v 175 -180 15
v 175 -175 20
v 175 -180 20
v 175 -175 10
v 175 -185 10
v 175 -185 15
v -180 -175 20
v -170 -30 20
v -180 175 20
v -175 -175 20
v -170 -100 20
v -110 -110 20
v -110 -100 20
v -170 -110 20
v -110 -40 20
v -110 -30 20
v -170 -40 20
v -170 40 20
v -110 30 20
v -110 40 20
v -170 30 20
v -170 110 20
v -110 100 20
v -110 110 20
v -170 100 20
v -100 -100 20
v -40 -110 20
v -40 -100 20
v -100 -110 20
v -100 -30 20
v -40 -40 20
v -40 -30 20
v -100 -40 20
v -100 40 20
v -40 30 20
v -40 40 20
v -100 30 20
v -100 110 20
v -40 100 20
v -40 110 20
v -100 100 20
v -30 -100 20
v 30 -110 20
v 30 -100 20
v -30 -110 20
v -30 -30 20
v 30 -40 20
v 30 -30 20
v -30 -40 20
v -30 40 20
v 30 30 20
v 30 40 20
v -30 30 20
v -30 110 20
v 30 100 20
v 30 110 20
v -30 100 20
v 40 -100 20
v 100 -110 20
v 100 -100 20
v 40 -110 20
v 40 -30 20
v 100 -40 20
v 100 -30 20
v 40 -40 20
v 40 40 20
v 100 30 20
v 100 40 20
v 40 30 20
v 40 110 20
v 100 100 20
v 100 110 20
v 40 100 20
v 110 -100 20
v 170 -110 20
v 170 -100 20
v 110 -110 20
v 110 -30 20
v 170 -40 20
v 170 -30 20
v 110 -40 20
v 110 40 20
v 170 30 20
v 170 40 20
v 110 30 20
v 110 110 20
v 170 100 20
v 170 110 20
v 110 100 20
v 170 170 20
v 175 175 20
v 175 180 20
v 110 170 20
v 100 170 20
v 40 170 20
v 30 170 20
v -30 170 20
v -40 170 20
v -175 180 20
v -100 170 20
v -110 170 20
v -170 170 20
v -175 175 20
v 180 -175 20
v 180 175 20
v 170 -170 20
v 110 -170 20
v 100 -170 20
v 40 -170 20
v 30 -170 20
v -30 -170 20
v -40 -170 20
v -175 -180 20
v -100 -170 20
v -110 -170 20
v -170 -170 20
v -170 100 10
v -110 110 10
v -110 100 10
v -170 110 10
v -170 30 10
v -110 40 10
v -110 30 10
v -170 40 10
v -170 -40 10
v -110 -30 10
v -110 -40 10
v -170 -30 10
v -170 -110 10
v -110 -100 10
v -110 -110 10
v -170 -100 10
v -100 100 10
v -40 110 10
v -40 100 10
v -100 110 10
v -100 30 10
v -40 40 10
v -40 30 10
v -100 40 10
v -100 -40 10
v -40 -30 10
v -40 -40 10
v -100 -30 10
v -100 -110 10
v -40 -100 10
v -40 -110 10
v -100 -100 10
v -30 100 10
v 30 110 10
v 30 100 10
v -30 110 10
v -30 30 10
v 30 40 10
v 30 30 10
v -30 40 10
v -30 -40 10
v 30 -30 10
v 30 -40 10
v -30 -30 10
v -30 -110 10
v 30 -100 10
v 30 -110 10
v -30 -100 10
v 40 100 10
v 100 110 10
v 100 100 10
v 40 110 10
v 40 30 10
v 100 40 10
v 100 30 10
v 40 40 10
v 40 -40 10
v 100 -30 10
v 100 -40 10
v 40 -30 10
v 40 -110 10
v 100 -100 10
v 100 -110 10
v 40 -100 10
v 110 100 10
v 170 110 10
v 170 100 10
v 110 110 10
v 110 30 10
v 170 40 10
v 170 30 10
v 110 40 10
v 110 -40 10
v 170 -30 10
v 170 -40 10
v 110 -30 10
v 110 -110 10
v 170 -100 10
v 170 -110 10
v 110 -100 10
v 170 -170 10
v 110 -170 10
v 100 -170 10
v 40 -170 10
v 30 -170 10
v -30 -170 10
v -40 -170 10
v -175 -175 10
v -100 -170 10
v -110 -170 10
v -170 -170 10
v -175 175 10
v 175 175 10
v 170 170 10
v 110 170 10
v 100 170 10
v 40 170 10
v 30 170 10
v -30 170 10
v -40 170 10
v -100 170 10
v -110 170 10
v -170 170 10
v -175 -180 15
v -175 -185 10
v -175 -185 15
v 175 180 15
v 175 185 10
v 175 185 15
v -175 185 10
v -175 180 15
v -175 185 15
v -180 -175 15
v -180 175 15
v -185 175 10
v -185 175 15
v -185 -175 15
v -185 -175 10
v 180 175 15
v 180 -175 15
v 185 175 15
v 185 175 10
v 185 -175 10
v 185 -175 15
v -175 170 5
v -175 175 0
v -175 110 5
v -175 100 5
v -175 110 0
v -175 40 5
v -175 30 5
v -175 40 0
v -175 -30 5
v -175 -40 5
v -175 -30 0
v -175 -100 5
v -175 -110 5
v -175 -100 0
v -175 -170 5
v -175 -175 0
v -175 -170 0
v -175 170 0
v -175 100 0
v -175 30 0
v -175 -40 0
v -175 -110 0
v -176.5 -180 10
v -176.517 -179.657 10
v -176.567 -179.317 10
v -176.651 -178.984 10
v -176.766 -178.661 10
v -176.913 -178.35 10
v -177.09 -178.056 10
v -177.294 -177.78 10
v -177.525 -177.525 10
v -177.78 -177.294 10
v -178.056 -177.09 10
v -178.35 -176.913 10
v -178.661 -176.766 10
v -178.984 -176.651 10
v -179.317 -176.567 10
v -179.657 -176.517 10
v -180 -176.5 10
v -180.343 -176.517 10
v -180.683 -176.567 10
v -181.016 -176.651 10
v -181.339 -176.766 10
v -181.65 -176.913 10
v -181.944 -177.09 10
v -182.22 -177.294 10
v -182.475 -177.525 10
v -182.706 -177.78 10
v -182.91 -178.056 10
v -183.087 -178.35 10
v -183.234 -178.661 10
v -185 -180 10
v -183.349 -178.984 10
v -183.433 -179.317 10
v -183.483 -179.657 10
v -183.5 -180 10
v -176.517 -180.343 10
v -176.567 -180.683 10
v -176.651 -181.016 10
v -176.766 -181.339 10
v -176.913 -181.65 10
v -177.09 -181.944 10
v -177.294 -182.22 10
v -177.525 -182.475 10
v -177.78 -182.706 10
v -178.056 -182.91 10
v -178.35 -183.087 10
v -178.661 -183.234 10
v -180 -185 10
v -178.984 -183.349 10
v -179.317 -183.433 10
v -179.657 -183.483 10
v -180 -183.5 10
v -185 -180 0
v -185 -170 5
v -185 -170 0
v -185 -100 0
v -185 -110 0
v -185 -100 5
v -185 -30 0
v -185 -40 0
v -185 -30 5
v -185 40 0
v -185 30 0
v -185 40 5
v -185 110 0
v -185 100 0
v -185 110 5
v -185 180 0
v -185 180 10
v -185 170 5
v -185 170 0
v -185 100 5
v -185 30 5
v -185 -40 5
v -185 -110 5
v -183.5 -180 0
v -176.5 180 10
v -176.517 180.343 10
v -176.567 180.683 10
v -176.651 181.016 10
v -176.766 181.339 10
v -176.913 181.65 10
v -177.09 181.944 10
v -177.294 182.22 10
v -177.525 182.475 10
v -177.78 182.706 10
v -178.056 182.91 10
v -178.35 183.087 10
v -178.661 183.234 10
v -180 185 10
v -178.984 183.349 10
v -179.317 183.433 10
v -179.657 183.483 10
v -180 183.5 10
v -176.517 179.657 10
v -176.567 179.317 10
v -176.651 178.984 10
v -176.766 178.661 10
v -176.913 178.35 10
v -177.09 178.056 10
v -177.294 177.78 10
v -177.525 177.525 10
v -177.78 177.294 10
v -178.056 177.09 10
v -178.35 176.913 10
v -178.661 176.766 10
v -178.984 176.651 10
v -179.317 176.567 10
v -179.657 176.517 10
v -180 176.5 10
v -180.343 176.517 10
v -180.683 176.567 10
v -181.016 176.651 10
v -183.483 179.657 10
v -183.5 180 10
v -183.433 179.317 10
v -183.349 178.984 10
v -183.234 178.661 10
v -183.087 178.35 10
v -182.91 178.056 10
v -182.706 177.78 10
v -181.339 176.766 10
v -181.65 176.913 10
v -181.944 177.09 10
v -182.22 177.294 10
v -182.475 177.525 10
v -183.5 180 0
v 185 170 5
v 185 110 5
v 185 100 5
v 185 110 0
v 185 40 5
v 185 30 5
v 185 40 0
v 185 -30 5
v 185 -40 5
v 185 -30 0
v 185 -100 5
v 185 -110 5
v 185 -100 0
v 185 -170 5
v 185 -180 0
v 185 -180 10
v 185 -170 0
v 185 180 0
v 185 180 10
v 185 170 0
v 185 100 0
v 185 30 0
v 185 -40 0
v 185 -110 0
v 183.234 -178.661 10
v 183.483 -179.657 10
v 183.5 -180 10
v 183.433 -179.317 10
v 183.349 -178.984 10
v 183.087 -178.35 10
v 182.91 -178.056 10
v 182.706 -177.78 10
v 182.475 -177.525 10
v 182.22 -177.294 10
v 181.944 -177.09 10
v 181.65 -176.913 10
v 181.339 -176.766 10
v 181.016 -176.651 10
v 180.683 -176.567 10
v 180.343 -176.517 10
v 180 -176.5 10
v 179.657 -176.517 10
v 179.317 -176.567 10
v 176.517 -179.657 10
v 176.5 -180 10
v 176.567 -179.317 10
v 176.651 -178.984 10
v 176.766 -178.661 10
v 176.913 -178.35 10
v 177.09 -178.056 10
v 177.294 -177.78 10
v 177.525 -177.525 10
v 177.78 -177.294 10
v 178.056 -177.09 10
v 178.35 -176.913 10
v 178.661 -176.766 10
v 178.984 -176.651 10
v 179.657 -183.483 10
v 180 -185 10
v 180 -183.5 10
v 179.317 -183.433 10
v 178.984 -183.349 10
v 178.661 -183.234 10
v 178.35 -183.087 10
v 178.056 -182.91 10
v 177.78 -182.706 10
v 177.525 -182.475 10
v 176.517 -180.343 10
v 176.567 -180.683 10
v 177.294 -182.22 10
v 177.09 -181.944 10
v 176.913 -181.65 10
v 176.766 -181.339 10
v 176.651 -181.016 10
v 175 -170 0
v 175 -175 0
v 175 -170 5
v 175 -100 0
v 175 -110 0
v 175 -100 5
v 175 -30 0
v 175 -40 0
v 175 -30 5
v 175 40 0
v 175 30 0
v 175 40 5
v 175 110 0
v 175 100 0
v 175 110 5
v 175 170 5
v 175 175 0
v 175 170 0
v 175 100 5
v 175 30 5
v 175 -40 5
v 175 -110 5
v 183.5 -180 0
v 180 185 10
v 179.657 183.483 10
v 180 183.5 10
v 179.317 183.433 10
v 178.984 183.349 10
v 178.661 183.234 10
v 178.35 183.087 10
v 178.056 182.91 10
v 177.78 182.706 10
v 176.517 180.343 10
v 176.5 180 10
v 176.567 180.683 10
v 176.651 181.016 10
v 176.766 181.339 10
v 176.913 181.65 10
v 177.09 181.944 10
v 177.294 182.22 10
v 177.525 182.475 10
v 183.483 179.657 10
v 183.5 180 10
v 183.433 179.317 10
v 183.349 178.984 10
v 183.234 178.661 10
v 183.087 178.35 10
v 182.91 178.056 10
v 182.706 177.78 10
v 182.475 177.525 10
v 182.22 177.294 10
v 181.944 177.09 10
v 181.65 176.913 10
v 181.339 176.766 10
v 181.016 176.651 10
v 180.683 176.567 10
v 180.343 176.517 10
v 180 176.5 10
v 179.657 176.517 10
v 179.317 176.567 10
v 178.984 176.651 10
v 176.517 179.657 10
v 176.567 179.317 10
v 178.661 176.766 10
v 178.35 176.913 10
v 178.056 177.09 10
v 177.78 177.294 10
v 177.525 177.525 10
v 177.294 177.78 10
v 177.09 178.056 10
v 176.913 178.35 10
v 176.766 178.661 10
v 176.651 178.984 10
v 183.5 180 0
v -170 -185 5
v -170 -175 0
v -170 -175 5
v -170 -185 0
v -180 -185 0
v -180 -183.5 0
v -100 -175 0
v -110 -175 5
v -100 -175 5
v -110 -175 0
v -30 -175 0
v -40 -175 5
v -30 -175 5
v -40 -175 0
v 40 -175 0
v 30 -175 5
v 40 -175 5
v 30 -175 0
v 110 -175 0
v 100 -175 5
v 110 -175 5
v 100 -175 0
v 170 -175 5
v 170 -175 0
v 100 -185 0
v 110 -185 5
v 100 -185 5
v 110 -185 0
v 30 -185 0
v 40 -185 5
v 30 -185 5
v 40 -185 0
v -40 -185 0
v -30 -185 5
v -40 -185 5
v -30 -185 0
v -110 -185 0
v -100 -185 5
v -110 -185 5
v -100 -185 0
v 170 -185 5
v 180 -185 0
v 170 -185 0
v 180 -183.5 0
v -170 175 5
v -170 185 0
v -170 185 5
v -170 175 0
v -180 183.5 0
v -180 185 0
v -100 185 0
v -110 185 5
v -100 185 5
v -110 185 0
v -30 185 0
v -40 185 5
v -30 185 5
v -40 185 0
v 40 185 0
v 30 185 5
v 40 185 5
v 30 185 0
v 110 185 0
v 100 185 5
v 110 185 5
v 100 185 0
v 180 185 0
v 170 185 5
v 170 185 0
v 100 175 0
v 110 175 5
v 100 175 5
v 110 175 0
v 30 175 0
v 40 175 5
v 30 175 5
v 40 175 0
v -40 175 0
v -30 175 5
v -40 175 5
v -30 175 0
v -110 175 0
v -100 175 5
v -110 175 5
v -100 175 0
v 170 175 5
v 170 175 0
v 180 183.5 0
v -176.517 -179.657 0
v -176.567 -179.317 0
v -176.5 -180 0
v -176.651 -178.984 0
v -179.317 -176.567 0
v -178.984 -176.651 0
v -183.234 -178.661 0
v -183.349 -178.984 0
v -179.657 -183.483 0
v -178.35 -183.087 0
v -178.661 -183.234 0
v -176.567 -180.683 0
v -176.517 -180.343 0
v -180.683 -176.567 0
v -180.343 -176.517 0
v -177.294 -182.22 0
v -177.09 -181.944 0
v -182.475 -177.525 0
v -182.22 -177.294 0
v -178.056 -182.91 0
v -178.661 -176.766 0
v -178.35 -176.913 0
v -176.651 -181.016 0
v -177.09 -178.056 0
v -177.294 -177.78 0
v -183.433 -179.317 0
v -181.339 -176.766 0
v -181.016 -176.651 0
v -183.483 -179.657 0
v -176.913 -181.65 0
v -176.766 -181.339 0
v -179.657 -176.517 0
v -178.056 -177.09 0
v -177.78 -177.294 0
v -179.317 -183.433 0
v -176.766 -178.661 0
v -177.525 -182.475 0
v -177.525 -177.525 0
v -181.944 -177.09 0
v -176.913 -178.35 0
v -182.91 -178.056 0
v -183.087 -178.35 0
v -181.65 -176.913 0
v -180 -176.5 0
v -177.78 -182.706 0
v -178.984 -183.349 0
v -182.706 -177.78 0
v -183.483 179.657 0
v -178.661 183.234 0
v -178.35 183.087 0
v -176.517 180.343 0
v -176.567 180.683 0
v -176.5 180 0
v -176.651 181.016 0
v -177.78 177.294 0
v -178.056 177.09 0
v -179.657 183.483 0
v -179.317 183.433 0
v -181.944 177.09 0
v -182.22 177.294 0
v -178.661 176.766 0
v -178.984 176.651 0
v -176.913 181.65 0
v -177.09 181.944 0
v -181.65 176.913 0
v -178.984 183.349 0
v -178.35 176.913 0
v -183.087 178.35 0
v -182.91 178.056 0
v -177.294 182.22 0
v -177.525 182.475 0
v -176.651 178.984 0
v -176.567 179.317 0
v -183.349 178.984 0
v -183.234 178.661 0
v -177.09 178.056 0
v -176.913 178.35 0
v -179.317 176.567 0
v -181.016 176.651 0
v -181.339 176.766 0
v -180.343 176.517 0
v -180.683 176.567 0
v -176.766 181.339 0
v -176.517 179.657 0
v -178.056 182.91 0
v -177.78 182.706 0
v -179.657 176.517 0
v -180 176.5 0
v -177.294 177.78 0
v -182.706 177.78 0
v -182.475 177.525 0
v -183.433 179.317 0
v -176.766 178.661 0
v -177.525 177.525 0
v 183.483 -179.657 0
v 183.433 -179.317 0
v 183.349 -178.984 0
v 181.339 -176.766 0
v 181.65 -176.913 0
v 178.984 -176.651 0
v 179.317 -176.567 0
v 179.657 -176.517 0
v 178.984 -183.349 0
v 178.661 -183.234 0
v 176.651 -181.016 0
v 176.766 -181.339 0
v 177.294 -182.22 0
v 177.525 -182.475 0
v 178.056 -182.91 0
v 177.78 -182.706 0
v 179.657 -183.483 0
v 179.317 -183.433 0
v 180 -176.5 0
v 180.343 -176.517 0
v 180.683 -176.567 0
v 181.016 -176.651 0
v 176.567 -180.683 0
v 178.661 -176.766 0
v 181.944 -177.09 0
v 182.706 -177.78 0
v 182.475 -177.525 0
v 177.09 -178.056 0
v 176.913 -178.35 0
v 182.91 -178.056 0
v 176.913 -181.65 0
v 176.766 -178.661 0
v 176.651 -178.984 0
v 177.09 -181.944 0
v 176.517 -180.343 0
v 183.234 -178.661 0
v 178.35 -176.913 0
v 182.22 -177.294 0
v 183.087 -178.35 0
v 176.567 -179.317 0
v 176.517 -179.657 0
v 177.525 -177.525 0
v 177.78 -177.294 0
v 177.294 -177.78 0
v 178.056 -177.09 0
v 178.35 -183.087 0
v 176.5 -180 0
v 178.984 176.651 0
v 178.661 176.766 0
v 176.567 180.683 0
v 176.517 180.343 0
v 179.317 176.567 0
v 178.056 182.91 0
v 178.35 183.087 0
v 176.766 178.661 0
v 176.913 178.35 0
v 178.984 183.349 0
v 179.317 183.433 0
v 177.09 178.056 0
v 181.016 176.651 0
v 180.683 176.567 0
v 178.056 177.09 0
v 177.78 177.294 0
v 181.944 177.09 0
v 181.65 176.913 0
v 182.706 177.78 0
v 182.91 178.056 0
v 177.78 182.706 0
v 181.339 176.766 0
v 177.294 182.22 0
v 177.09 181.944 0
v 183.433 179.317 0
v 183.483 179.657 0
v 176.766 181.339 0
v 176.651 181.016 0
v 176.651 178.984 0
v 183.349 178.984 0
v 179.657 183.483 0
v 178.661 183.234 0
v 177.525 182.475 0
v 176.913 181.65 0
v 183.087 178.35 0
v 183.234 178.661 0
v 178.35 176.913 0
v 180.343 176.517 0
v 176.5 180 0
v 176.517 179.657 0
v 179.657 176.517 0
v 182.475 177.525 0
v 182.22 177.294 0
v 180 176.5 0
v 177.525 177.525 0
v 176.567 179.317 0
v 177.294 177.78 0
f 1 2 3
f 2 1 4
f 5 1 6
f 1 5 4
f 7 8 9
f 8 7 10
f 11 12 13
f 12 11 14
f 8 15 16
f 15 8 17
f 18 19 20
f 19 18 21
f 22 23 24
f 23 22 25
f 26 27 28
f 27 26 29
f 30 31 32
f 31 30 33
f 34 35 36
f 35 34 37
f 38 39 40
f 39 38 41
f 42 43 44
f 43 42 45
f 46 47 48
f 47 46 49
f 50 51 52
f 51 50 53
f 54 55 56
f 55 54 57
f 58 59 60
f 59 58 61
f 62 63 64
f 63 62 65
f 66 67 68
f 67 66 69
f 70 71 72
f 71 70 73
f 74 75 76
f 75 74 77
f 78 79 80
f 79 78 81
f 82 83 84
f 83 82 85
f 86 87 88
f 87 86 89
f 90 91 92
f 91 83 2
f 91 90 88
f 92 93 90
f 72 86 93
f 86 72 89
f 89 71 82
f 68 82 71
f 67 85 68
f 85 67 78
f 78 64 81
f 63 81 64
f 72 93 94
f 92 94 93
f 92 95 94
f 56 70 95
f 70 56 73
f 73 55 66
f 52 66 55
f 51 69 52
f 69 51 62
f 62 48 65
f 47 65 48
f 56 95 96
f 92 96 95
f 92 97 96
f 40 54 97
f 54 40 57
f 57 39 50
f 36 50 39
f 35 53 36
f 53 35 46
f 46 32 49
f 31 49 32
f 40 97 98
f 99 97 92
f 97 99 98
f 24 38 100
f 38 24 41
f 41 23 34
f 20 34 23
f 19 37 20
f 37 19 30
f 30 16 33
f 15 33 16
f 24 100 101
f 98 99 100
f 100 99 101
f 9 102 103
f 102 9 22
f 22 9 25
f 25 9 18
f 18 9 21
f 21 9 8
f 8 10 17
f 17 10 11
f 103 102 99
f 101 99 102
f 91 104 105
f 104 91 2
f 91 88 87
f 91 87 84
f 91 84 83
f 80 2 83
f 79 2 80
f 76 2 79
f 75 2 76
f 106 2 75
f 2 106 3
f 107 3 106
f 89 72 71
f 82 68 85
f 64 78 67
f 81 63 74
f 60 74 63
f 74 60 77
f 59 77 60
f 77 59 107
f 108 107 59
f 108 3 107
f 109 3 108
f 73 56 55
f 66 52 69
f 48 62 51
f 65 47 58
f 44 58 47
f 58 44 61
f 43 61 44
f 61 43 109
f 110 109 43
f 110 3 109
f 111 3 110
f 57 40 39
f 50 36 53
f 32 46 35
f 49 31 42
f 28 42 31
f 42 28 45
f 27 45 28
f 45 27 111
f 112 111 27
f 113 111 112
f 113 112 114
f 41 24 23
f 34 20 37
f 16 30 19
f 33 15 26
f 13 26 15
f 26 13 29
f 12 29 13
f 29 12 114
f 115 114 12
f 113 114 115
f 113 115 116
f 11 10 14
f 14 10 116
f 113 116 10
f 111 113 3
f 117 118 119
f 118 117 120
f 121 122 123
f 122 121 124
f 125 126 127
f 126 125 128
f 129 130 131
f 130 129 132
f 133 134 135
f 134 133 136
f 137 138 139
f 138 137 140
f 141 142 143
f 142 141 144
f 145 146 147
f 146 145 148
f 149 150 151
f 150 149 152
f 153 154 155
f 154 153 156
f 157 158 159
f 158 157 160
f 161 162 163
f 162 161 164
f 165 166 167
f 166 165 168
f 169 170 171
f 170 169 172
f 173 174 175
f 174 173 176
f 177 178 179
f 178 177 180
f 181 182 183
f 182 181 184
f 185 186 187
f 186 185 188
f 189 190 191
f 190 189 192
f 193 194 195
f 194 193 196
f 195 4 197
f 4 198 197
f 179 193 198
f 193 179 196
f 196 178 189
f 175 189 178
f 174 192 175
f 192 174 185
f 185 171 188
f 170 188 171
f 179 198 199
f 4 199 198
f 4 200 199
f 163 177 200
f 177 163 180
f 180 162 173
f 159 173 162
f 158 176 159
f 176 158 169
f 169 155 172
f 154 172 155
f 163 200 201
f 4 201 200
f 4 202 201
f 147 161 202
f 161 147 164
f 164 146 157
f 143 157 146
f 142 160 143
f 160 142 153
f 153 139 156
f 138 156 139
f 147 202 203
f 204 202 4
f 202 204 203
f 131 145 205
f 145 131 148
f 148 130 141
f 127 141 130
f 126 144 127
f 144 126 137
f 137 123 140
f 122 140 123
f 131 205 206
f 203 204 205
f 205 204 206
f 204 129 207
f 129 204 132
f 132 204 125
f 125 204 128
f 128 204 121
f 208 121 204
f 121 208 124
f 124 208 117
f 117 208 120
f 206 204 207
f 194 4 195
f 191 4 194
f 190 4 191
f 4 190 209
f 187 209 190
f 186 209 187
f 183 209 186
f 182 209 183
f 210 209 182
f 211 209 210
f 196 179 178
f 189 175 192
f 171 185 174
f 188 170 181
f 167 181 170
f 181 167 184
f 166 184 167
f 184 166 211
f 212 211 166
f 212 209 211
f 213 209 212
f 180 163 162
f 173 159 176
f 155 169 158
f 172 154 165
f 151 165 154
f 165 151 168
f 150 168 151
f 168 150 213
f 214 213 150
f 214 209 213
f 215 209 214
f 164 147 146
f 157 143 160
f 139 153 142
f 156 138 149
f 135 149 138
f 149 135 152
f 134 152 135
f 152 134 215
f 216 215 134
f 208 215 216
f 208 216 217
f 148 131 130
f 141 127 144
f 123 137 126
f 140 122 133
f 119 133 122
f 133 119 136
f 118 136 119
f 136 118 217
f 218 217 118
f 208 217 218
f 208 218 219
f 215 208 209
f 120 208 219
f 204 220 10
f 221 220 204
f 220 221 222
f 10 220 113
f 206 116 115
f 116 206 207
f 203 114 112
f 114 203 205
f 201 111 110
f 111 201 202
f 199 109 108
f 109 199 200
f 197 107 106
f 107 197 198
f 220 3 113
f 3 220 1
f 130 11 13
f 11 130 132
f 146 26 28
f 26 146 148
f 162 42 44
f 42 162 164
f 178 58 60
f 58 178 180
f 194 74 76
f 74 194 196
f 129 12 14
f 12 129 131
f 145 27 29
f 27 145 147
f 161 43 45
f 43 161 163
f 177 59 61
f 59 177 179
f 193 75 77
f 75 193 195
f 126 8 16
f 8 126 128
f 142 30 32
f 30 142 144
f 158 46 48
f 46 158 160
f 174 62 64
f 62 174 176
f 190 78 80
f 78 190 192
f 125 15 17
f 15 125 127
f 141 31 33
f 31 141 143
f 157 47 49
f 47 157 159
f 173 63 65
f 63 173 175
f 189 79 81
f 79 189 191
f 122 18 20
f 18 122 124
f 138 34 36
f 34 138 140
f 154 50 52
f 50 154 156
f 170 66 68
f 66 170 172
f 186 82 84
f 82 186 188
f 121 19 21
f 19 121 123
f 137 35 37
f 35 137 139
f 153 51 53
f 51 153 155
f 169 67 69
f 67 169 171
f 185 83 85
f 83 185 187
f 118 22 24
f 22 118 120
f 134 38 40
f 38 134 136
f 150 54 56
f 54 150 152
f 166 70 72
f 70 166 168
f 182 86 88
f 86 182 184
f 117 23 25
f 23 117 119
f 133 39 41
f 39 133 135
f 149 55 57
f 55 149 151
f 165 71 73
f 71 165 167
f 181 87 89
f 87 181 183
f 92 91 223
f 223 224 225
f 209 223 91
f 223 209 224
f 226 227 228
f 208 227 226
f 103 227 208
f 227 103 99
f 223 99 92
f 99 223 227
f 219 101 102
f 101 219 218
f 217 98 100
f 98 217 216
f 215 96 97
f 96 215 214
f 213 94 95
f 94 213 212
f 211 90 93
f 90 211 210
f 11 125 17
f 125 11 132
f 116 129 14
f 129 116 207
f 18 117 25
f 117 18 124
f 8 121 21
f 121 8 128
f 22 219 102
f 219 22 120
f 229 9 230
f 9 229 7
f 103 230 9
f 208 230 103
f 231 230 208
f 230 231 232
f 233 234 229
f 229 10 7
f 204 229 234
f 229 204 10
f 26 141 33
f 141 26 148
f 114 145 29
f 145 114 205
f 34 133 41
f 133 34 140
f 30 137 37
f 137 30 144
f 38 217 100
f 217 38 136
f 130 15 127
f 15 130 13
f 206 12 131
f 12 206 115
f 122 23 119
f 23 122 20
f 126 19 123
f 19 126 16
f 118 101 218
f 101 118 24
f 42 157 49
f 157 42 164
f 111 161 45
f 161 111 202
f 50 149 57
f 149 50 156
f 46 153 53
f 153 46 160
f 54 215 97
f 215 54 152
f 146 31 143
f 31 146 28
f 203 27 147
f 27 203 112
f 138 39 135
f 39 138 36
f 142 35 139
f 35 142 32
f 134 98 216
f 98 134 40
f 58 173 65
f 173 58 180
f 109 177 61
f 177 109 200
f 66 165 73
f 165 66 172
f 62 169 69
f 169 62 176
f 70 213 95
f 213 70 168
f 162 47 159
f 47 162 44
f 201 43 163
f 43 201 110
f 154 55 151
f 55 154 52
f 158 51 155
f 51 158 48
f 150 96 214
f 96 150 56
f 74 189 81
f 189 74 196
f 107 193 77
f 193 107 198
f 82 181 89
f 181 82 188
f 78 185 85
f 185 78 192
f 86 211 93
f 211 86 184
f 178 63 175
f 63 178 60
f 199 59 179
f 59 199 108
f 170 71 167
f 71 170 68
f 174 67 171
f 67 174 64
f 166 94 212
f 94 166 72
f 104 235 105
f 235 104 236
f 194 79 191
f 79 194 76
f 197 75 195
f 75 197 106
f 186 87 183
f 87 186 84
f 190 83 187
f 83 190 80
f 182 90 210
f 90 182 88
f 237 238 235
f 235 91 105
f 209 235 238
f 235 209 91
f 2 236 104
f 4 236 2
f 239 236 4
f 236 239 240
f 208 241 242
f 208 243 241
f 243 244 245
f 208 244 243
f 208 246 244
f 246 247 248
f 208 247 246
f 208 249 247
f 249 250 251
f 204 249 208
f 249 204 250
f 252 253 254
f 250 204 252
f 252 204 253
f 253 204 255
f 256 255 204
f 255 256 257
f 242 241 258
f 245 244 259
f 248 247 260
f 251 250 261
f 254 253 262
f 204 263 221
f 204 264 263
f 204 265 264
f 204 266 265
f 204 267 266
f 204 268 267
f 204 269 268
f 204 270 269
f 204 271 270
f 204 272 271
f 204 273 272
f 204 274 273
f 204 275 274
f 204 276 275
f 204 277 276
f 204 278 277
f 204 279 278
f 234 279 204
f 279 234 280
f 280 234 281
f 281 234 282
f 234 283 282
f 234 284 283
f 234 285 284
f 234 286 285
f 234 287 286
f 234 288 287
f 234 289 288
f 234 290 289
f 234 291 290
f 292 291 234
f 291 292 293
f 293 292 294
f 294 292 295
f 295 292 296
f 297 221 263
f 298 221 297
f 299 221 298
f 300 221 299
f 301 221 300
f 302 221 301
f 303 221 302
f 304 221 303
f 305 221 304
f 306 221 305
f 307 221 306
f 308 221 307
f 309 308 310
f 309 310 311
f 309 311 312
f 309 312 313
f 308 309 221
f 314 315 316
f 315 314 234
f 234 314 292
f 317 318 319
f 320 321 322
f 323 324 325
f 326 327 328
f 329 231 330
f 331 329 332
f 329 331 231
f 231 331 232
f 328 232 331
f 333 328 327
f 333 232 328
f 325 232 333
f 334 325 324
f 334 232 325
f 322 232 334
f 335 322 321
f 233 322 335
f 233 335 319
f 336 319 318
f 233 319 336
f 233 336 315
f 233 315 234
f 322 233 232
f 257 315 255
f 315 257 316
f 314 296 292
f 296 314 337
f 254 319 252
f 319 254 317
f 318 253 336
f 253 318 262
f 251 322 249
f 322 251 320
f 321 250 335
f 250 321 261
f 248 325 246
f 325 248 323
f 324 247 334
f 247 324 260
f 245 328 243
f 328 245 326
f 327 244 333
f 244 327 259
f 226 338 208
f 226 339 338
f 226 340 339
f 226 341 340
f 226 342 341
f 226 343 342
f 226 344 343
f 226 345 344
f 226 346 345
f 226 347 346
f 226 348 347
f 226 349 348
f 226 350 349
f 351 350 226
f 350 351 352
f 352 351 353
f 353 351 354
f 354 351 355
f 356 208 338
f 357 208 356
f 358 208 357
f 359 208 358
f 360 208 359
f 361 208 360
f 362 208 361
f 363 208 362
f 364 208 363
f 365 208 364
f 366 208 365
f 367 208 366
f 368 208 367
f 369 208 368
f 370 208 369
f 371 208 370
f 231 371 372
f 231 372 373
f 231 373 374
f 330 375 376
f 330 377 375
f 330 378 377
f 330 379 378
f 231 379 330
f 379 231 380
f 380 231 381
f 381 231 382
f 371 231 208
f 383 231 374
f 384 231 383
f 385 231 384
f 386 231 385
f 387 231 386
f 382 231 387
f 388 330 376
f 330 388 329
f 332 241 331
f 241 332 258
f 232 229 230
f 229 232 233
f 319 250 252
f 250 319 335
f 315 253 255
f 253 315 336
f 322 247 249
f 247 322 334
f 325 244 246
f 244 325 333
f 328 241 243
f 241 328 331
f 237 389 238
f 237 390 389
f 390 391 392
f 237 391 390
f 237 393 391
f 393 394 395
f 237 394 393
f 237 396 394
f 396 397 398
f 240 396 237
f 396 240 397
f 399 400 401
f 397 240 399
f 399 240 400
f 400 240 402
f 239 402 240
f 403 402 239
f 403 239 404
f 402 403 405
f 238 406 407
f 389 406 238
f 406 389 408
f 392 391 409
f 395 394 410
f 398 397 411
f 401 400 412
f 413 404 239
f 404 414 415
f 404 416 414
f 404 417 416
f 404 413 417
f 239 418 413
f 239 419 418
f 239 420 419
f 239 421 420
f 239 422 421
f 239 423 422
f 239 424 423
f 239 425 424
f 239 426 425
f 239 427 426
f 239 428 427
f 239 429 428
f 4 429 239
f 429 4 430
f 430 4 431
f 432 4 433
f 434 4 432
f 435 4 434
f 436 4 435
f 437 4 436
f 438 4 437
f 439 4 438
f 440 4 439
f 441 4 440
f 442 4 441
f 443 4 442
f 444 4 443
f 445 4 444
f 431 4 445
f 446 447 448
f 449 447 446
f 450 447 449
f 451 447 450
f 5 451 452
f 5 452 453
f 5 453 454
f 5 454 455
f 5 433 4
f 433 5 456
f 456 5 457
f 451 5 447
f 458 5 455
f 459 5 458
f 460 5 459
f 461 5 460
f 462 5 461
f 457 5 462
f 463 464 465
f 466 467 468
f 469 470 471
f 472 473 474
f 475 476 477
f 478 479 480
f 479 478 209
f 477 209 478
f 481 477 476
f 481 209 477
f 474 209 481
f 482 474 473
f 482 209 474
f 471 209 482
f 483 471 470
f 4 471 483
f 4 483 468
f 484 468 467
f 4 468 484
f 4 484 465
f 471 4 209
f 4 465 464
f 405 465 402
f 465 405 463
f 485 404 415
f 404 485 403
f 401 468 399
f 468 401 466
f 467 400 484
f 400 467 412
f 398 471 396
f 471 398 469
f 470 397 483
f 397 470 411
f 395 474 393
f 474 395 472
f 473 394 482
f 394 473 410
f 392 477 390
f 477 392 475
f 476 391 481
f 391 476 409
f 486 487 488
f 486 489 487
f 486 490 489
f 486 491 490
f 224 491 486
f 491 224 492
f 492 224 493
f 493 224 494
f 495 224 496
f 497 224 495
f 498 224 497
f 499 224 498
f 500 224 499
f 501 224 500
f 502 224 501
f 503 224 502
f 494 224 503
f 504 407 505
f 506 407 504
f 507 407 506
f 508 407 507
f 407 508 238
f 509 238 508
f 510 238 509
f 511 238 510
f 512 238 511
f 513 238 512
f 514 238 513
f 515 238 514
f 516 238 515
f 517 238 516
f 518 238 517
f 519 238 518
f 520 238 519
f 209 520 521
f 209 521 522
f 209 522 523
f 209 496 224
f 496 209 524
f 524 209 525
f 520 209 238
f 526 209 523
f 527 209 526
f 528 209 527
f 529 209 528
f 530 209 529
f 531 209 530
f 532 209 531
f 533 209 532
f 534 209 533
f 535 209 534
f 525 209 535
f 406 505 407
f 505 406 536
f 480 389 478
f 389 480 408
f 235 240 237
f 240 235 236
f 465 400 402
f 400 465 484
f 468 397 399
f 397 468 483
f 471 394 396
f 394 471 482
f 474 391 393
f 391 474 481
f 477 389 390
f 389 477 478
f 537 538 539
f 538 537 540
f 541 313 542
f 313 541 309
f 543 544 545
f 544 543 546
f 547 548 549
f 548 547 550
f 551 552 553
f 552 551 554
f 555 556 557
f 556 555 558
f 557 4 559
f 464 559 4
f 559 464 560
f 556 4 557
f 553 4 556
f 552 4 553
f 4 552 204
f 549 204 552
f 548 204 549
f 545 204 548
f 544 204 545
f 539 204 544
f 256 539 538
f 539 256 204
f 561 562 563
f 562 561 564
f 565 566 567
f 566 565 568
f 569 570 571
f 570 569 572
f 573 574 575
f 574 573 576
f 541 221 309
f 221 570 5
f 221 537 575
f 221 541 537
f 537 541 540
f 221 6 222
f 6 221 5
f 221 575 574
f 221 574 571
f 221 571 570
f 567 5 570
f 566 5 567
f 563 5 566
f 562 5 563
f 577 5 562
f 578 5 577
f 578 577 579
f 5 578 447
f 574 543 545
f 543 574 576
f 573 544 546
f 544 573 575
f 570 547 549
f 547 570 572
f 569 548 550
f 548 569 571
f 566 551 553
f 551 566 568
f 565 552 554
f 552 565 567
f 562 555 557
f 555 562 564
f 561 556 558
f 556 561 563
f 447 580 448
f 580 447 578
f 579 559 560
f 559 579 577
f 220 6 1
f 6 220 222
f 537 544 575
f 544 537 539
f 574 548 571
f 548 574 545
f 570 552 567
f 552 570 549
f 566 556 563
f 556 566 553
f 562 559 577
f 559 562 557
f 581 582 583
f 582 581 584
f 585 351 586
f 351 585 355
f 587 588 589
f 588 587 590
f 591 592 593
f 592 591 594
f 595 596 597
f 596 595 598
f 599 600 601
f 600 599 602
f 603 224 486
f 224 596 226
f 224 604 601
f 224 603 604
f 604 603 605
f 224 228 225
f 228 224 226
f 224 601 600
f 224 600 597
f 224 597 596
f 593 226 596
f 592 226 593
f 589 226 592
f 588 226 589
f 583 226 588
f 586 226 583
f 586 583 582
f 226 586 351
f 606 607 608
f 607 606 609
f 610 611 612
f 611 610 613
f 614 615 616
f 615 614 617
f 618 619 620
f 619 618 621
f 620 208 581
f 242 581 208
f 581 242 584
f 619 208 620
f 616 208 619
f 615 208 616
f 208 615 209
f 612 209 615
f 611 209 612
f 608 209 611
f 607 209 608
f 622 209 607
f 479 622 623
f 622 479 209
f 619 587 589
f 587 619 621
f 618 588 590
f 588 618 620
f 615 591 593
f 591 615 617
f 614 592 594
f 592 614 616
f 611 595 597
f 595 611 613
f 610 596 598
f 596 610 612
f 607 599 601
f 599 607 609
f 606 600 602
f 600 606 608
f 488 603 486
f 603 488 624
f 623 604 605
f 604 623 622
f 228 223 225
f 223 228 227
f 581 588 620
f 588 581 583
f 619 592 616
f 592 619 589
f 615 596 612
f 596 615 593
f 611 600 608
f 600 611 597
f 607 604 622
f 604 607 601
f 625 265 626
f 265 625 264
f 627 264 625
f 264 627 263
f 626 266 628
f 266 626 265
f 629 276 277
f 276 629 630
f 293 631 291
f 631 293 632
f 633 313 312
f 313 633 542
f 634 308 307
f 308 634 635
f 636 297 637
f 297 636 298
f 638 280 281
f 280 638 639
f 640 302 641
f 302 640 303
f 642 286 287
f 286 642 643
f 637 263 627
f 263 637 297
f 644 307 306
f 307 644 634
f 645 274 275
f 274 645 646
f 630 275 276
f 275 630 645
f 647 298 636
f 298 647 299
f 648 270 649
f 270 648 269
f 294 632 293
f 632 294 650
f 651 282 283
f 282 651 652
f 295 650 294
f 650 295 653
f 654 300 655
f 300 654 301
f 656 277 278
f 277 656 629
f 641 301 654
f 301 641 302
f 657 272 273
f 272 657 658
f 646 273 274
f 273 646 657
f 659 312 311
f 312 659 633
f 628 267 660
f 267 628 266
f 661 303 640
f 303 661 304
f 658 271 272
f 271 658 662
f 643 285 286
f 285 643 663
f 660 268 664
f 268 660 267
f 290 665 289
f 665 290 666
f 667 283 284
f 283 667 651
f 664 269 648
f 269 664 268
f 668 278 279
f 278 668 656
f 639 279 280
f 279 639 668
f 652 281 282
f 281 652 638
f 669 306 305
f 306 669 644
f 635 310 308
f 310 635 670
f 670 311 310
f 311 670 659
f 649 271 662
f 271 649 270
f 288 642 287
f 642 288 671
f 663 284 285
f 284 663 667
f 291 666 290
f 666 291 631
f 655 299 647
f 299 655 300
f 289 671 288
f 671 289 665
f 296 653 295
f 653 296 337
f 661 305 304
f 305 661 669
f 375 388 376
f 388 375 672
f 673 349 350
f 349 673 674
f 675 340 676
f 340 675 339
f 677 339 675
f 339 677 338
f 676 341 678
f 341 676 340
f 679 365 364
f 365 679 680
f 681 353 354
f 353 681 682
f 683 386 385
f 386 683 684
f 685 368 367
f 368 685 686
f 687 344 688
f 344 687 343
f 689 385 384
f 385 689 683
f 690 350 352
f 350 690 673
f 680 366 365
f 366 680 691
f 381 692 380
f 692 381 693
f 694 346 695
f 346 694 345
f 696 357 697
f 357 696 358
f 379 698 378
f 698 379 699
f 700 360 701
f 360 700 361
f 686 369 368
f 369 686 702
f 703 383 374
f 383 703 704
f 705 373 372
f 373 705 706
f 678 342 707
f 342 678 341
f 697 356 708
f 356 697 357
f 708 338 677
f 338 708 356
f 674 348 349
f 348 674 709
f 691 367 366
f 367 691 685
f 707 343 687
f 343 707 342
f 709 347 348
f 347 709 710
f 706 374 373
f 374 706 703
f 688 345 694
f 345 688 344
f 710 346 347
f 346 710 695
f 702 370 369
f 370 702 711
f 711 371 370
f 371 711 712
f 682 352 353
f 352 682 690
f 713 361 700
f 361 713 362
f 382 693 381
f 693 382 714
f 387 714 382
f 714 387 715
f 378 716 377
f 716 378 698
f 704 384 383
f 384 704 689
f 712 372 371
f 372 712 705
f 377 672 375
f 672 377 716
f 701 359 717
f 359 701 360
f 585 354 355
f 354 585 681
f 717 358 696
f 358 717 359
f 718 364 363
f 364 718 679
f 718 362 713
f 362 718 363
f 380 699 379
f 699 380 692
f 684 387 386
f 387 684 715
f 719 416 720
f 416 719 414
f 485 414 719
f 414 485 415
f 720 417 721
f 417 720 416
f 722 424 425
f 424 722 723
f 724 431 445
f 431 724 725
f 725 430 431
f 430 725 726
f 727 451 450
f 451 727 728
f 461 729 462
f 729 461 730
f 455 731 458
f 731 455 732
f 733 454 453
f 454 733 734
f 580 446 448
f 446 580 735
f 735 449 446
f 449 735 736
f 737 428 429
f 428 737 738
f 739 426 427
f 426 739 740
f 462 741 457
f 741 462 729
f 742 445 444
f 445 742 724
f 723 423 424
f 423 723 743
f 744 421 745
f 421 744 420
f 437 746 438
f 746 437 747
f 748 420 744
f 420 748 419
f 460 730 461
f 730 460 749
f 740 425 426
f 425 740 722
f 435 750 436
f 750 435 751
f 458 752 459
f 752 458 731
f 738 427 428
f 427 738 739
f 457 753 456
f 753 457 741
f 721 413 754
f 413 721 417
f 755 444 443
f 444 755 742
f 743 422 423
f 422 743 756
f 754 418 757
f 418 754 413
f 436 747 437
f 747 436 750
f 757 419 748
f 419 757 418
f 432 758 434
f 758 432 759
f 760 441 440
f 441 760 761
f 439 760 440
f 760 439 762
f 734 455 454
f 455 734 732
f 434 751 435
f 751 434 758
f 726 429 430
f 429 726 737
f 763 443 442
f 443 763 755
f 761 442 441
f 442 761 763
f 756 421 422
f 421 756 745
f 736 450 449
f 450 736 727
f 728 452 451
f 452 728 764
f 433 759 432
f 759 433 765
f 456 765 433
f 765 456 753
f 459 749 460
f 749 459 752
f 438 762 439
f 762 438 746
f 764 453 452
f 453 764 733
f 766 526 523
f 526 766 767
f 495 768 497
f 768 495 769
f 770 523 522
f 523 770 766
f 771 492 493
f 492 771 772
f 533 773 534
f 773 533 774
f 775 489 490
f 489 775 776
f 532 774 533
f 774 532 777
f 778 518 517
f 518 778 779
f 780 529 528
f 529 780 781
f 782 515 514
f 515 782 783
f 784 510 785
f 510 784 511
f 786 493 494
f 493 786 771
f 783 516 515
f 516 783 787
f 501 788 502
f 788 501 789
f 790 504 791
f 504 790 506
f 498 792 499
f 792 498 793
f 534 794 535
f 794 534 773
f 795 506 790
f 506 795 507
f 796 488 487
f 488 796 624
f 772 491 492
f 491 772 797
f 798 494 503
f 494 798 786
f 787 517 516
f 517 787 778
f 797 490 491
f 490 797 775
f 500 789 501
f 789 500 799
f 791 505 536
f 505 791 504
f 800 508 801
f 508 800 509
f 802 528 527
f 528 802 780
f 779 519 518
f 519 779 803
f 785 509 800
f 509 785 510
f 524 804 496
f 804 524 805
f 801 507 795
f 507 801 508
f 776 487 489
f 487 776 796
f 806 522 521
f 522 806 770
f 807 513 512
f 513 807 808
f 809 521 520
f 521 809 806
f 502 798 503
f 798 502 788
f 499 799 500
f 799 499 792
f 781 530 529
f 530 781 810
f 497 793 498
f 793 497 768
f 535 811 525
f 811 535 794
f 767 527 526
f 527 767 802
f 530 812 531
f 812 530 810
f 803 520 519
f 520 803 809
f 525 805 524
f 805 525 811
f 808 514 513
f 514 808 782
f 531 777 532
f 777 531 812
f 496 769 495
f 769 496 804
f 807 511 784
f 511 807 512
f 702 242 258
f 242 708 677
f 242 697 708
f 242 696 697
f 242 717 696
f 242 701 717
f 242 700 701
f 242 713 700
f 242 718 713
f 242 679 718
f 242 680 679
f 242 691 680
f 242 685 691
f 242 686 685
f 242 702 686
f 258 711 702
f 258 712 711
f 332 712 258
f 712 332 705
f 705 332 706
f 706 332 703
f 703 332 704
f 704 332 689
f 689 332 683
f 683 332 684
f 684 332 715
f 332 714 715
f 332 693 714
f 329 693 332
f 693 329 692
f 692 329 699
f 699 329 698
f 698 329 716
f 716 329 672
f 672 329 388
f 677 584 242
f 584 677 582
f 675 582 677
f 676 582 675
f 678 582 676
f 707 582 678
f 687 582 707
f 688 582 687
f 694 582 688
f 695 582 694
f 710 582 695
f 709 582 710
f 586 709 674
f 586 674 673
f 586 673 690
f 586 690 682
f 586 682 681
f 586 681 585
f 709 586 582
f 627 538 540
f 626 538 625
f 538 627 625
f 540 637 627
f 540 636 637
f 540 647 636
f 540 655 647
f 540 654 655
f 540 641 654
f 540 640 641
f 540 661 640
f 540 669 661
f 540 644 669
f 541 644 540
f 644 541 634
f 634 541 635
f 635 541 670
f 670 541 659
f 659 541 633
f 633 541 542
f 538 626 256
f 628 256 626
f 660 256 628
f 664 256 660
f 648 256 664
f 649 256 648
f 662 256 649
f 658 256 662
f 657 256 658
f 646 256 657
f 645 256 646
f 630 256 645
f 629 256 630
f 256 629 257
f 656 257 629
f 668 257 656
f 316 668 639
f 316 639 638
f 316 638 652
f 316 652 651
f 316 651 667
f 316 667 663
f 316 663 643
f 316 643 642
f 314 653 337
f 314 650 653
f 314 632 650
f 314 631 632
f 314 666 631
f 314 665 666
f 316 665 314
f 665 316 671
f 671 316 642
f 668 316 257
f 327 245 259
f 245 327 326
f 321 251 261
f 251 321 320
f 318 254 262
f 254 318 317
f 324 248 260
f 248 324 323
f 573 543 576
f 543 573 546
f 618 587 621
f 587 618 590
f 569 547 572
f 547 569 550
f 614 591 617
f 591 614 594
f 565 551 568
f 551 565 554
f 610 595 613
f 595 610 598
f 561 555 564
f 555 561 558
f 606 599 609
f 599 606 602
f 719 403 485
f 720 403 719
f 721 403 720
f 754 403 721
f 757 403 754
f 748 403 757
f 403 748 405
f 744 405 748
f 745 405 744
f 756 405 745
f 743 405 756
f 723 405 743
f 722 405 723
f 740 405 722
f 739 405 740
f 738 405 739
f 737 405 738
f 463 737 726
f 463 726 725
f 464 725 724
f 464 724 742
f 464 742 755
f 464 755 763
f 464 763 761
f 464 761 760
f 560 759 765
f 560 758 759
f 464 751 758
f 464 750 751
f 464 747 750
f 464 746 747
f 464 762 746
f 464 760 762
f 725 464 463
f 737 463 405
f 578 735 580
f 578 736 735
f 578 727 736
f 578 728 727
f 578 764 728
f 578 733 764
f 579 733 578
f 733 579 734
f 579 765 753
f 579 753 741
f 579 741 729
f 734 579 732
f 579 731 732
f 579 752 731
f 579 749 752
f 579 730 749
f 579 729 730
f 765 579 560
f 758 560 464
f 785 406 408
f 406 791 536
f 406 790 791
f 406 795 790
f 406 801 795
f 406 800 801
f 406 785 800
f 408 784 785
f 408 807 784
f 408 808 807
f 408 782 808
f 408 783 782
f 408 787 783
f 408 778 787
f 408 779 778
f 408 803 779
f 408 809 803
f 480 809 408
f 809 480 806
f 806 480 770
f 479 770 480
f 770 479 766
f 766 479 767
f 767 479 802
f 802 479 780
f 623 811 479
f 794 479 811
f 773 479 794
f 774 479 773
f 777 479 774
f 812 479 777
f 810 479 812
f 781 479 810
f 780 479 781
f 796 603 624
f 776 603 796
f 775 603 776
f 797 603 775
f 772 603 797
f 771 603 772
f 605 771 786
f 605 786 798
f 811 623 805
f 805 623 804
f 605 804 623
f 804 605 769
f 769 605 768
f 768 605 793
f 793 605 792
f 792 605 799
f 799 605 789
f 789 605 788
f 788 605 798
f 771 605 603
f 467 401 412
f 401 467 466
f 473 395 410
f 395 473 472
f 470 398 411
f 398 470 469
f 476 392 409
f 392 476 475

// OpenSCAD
/*
  Cage slice 15 of 15 (top slice including the roof grid)
*/

bar = 10;
half_inner = 175;
gap = 70;
rod_d = 7;
half_outer = half_inner + bar;

function grid_pos(n) = -half_inner + n * gap;

module cage_full() {
  difference() {
    union() {
      // Floor grid at z = -10 .. 0
      for (j = [0:5]) {
        y = grid_pos(j);
        translate([-half_inner, y - bar/2, -bar])
          cube([2*half_inner, bar, bar], center=false);
      }
      for (i = [0:5]) {
        x = grid_pos(i);
        translate([x - bar/2, -half_inner, -bar])
          cube([bar, 2*half_inner, bar], center=false);
      }

      // Roof grid at z = 700 .. 710
      for (j = [0:5]) {
        y = grid_pos(j);
        translate([-half_inner, y - bar/2, 700])
          cube([2*half_inner, bar, bar], center=false);
      }
      for (i = [0:5]) {
        x = grid_pos(i);
        translate([x - bar/2, -half_inner, 700])
          cube([bar, 2*half_inner, bar], center=false);
      }

      // Side walls at x = ±175
      for (side = [-1, 1]) {
        sx = side * half_inner;
        x0 = (side == 1) ? sx : sx - bar;
        for (j = [0:5]) {
          y = grid_pos(j);
          translate([x0, y - bar/2, 0])
            cube([bar, bar, 700], center=false);
        }
        for (k = [0:10]) {
          zc = 0 + k * gap;
          translate([x0, -half_inner, zc - bar/2])
            cube([bar, 2*half_inner, bar], center=false);
        }
      }

      // Front/back walls at y = ±175
      for (side = [-1, 1]) {
        sy = side * half_inner;
        y0 = (side == 1) ? sy : sy - bar;
        for (i = [0:5]) {
          x = grid_pos(i);
          translate([x - bar/2, y0, 0])
            cube([bar, bar, 700], center=false);
        }
        for (k = [0:10]) {
          zc = 0 + k * gap;
          translate([-half_inner, y0, zc - bar/2])
            cube([2*half_inner, bar, bar], center=false);
        }
      }
    }

    for (sx = [-1, 1], sy = [-1, 1]) {
      translate([sx * (half_inner + bar/2),
                 sy * (half_inner + bar/2),
                 -20])
        cylinder(d = rod_d, h = 740, $fn = 64);
    }
  }
}

// Shorter top slice (20 mm tall in model coordinates)
z_min = 690;
z_max = 710;  // height 20 mm

module slice() {
  intersection() {
    cage_full();
    translate([-half_outer - 5, -half_outer - 5, z_min])
      cube([2*(half_outer + 5), 2*(half_outer + 5), z_max - z_min], center=false);
  }
}

translate([0, 0, -z_min])
  slice();
